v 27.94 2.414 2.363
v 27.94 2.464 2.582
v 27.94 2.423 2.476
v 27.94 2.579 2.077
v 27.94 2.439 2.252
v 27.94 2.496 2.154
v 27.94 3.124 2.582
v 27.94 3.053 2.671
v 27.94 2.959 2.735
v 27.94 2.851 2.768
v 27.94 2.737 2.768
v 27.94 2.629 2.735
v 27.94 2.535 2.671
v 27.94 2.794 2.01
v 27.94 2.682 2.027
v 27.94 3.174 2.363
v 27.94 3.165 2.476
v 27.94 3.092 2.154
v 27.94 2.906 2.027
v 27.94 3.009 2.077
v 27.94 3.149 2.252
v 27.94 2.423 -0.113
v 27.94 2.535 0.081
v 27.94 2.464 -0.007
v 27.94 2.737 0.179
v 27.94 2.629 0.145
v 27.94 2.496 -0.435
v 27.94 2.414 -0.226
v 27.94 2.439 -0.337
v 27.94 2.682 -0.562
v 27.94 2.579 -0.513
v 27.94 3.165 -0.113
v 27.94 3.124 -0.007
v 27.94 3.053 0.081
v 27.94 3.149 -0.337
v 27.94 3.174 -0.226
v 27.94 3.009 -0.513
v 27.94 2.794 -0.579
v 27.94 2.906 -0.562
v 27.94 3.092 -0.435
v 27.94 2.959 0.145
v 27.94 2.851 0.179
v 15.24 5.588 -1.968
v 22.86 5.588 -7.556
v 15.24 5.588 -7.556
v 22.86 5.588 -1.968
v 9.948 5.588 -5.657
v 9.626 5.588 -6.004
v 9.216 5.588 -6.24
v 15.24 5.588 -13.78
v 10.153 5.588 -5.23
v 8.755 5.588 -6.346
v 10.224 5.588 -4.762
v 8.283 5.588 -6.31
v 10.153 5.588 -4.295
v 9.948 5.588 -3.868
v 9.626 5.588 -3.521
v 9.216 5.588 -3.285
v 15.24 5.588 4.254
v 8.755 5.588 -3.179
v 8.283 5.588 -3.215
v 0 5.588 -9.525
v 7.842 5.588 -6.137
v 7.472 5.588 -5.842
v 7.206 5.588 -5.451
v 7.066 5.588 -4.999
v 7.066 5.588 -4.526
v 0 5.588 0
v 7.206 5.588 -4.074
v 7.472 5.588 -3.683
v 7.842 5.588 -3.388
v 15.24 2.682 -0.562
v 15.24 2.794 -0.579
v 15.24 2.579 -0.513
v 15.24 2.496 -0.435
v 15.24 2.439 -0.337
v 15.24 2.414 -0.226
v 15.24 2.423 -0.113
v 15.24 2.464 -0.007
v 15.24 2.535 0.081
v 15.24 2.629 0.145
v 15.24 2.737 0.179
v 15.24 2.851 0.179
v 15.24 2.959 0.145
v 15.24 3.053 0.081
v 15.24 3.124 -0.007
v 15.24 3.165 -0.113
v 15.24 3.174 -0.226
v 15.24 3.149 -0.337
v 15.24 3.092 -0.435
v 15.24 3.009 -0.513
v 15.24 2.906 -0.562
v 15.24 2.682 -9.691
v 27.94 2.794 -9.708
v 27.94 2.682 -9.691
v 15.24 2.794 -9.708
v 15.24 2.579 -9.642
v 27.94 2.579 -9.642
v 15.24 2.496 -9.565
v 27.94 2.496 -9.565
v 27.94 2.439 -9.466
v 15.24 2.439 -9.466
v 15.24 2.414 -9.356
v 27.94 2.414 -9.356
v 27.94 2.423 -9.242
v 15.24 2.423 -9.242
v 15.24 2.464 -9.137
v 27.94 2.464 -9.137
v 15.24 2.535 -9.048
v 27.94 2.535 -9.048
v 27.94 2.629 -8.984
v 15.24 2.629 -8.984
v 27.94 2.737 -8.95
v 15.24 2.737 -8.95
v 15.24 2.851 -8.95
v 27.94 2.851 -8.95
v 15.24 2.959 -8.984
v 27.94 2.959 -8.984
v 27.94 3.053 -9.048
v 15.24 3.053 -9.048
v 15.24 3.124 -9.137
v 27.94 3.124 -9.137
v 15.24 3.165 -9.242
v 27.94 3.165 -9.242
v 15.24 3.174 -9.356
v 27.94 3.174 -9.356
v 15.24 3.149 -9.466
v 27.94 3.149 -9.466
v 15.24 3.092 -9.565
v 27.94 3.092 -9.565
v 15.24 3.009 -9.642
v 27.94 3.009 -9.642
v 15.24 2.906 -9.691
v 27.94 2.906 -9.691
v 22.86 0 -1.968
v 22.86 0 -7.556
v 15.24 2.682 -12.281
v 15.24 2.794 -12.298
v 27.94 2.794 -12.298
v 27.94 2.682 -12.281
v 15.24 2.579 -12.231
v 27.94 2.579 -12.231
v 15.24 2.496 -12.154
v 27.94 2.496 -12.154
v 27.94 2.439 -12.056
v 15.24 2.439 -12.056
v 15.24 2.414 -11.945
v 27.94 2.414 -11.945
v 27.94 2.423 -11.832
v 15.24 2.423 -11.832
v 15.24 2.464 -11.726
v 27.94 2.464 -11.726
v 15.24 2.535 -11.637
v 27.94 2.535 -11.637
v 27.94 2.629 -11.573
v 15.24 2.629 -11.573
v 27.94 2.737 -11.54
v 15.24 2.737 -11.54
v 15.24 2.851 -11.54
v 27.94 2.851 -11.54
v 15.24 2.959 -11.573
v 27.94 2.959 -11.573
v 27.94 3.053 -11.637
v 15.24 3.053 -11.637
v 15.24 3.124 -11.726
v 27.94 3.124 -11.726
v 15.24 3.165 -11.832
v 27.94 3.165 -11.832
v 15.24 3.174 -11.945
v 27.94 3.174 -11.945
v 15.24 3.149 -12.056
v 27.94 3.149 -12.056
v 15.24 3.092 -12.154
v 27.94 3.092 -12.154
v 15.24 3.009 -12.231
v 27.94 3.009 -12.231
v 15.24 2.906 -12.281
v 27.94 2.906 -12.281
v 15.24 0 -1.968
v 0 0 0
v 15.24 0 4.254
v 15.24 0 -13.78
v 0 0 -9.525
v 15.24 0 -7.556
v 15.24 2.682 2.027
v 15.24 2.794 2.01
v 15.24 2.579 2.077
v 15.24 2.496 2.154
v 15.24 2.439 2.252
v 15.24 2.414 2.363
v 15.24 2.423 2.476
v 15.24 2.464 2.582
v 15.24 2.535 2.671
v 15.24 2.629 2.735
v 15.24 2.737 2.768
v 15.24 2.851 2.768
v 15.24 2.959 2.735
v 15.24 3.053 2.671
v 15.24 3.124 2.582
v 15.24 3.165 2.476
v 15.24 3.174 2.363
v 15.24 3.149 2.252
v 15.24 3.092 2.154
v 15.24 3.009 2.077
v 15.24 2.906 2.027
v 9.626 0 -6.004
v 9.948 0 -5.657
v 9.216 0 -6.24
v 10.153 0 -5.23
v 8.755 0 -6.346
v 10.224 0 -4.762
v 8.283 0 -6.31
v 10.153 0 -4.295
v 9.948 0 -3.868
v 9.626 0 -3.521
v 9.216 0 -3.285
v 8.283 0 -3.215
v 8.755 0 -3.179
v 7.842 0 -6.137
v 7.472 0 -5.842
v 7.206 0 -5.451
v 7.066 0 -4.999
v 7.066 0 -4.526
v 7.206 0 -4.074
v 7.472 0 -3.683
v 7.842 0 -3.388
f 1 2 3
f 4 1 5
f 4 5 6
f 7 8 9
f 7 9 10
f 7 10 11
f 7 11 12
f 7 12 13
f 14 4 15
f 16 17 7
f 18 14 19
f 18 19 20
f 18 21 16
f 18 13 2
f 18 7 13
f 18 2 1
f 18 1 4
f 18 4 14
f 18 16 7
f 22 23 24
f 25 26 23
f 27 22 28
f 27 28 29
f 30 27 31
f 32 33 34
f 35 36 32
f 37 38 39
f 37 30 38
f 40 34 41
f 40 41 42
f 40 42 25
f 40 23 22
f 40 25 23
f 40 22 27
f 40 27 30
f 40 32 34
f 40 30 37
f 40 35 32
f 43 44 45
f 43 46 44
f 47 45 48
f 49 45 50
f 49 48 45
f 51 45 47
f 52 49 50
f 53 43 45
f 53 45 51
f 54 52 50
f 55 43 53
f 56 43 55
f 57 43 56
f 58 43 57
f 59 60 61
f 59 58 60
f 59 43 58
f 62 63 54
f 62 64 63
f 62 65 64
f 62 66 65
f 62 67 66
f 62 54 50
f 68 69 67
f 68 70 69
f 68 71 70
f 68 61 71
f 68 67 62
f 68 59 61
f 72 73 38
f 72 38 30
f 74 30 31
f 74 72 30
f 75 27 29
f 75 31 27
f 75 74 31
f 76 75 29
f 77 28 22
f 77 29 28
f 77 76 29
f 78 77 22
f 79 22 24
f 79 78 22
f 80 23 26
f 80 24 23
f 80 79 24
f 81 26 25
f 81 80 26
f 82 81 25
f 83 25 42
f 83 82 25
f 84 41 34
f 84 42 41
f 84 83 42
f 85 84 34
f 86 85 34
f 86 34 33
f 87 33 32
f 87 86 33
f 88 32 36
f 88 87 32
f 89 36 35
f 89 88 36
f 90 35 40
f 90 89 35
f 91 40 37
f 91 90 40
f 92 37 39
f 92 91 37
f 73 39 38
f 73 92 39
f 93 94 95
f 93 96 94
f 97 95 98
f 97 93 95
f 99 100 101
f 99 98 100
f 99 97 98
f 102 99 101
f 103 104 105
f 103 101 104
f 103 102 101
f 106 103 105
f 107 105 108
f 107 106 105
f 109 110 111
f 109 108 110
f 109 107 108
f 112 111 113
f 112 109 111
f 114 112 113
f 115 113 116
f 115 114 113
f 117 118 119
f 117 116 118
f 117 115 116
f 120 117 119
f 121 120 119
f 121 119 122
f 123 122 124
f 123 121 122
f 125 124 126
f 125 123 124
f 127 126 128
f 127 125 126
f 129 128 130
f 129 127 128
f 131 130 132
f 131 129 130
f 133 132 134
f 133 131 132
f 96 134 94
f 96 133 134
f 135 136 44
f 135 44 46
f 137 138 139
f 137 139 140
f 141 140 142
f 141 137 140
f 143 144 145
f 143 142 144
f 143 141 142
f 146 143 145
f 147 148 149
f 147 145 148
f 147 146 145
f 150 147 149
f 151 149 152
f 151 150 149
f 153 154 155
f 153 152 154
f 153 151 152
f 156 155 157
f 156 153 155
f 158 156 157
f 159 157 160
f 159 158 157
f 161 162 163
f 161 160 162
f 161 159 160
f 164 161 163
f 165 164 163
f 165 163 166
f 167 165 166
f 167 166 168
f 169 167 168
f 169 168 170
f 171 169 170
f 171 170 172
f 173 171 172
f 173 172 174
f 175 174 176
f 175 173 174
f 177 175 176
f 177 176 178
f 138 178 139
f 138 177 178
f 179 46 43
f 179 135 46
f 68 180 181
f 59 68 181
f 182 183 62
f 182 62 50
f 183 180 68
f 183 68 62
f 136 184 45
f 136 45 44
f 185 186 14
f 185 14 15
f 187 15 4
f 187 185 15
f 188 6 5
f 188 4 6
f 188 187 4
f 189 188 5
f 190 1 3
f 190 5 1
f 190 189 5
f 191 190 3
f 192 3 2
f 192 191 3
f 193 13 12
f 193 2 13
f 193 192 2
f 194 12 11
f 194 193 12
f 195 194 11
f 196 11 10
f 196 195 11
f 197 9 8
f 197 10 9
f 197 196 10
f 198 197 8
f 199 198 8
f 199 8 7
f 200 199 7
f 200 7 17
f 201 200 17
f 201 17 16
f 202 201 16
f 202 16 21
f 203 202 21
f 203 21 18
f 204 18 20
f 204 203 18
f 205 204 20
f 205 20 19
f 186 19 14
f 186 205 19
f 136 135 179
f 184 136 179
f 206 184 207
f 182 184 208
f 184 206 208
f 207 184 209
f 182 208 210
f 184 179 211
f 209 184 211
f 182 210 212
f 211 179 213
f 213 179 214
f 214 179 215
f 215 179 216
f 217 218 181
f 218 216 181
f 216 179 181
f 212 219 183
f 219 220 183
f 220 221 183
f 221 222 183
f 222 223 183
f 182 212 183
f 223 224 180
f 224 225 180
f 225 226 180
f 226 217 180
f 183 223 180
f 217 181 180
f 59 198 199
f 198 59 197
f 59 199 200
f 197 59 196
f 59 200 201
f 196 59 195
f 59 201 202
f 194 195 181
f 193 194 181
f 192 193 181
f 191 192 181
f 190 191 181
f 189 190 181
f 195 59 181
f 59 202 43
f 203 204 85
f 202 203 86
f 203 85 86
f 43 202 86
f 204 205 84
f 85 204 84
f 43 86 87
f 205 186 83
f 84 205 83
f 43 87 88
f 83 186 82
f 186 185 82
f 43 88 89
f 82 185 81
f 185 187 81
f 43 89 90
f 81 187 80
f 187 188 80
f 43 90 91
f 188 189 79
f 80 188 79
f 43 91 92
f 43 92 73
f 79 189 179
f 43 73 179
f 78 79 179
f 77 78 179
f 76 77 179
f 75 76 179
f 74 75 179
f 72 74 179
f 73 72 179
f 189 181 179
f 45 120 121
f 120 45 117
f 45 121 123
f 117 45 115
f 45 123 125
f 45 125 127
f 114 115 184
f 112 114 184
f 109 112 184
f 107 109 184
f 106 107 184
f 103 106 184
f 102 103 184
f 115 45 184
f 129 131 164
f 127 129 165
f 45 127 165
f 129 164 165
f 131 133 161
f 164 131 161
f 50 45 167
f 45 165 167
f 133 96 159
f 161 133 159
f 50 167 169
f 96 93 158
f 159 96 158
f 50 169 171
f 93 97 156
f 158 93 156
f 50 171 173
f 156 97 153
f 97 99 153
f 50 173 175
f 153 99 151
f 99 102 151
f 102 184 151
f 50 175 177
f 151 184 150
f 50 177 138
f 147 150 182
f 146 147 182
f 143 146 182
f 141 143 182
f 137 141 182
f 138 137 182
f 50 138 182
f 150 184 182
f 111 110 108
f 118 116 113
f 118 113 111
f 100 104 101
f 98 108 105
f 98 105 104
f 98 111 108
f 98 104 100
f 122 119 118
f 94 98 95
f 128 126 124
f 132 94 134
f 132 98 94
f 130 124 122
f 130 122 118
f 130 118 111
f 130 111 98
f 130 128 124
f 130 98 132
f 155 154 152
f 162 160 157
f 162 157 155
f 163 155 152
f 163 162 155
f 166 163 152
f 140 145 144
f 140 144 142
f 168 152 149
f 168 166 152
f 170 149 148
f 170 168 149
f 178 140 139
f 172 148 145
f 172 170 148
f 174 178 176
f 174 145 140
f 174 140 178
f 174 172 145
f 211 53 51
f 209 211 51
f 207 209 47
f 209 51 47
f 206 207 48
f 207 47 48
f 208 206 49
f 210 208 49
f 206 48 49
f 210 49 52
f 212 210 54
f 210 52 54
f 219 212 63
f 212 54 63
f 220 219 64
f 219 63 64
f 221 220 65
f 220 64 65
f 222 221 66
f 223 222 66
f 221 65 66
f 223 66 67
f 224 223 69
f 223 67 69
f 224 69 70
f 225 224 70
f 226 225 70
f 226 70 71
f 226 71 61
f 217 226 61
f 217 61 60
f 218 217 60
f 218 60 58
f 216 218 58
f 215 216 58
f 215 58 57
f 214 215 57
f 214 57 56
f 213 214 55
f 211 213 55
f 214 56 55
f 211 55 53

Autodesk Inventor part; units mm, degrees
ref_plane "YZ Plane" through (0, 0, 0) normal (1, 0, 0) x (0, 1, 0)
ref_plane "XZ Plane" through (0, 0, 0) normal (0, 1, 0) x (-1, 0, 0)
sketch "Sketch1" plane through (0, 0, 0) normal (0, 1, 0) x (-1, 0, 0)
  line L0 (0, 0) -> (0, -9.525)
  line L1 (-15.24, 4.2545) -> (-15.24, -13.7795)
  line L2 (0, 0) -> (-15.24, 4.2545)
  line L3 (0, -9.525) -> (-15.24, -13.7795)
  line L4 (-15.24, 4.2545) -> (-19.05, 4.2545)
  line L5 (-19.05, 4.2545) -> (-19.05, 2.9845)
  line L6 (-19.05, 2.9845) -> (-15.24, 2.9845)
  line L7 (-15.24, 2.9845) -> (-15.24, 4.2545)
  line L8 (-15.24, -13.7795) -> (-19.05, -13.7795)
  line L9 (-19.05, -13.7795) -> (-19.05, -12.5095)
  line L10 (-19.05, -12.5095) -> (-15.24, -12.5095)
  line L11 (-15.24, -12.5095) -> (-15.24, -13.7795)
  line L12 (0, 0) -> (0, 3.175)
  line L13 (-15.24, 4.2545) -> (-15.24, 7.4295)
  line L14 (0, -9.525) -> (0, -12.7)
  line L15 (-15.24, -13.7795) -> (-15.24, -16.9545)
  line L16 (-15.24, -16.9545) -> (0, -12.7)
  line L17 (0, 3.175) -> (-15.24, 7.4295)
  line L18 (-15.24, 7.4295) -> (-34.29, 7.4295)
  line L19 (-19.05, 4.2545) -> (-34.29, 4.2545)
  line L20 (-34.29, 4.2545) -> (-34.29, 7.4295)
  line L21 (-15.24, -16.9545) -> (-34.29, -16.9545)
  line L22 (-34.29, -16.9545) -> (-34.29, -13.7795)
  line L23 (-34.29, -13.7795) -> (-19.05, -13.7795)
  line L24 (-34.29, 7.4295) -> (-37.465, 7.4295)
  line L25 (-37.465, 7.4295) -> (-37.465, -17.5895)
  line L26 (-37.465, -17.5895) -> (-34.29, -17.5895)
  line L27 (-34.29, -17.5895) -> (-34.29, 7.4295)
  line L28 (-15.24, -13.7795) -> (-34.29, -13.7795)
  line L29 (-34.29, -13.7795) -> (-34.29, 4.2545)
  line L30 (-34.29, 4.2545) -> (-15.24, 4.2545)
  line L31 (-15.24, 4.2545) -> (-15.24, -13.7795)
  line L32 (-15.24, 4.2545) -> (-34.29, 4.2545)
  line L33 (-34.29, 4.2545) -> (-34.29, 7.4295)
  line L34 (-34.29, 7.4295) -> (-15.24, 7.4295)
  line L35 (-15.24, 7.4295) -> (-15.24, 4.2545)
  line L36 (-15.24, -7.5565) -> (-22.86, -7.5565)
  line L37 (-22.86, -7.5565) -> (-22.86, -1.9685)
  line L38 (-22.86, -1.9685) -> (-15.24, -1.9685)
  line L39 (-15.24, -1.9685) -> (-15.24, -7.5565)
  dimension "d0" = 9.525
  dimension "d1" = 15.24
  dimension "d2" = 18.034
  dimension "d3" = 4.2545
  dimension "d4" = 3.81
  dimension "d5" = 1.27
  dimension "d6" = 3.81
  dimension "d7" = 1.27
  dimension "d8" = 3.175
  dimension "d9" = 3.175
  dimension "d10" = 3.175
  dimension "d11" = 3.175
  dimension "d12" = 19.05
  dimension "d13" = 3.175
  dimension "d30" = 7.62
  dimension "d31" = 5.588
  dimension "d32" = 6.223
extrude "Extrusion6" add sketch "Sketch1" along normal blind 5.588 contours L0 L3 L1 L2 | L1 L36 L37 L38
sketch "Sketch5" plane through (0, 5.588, 0) normal (0, 1, 0) x (1, 0, 0)
  circle A0 centre (8.636, 4.7625) radius 1.5875
  line L0 (0, 9.525) -> (0, 0) projected
  dimension "d35" = 3.175
  dimension "d36" = 8.636
extrude "Extrusion7" cut sketch "Sketch5" against normal blind 5.588
sketch "Sketch6" plane through (15.24, 0, 4.2545) normal (1, 0, 0) x (0, 0, -1)
  line L0 (6.223, 0) -> (6.223, 5.588) projected
  line L1 (0, 5.588) -> (6.223, 5.588) projected
  line L2 (0, 0) -> (0, 5.588) projected
  line L3 (0, 0) -> (6.223, 0) projected
  line L4 (11.811, 5.588) -> (11.811, 0) projected
  line L5 (11.811, 0) -> (18.034, 0) projected
  line L6 (18.034, 0) -> (18.034, 5.588) projected
  line L7 (11.811, 5.588) -> (18.034, 5.588) projected
  circle A0 centre (1.863, 2.794) radius 0.381
  circle A1 centre (4.4524, 2.794) radius 0.381
  line L8 (6.223, 5.588) -> (11.811, 5.588) projected
  line L9 (9.017, 5.588) -> (9.017, 8.4963)
  circle A2 centre (16.171, 2.794) radius 0.381
  circle A3 centre (13.5816, 2.794) radius 0.381
  point P0 (4.2545, 0)
  dimension "d39" = 0.762
  dimension "d40" = 0.762
extrude "Extrusion8" add sketch "Sketch6" along normal blind 12.7 contours A0 | A1 | A2 | A3
ref_plane "Work Plane1" through (15.24, 0, -4.7625) normal (0, 0, 1) x (1, 0, 0)
equation "\"d3\" = -0.5 * d0 + 0.5 * d2"
equation "\"d32\" = -0.5 * d31 + 0.5 * d2"
properties part number "photoTransistor" material "ABS Plastic"
